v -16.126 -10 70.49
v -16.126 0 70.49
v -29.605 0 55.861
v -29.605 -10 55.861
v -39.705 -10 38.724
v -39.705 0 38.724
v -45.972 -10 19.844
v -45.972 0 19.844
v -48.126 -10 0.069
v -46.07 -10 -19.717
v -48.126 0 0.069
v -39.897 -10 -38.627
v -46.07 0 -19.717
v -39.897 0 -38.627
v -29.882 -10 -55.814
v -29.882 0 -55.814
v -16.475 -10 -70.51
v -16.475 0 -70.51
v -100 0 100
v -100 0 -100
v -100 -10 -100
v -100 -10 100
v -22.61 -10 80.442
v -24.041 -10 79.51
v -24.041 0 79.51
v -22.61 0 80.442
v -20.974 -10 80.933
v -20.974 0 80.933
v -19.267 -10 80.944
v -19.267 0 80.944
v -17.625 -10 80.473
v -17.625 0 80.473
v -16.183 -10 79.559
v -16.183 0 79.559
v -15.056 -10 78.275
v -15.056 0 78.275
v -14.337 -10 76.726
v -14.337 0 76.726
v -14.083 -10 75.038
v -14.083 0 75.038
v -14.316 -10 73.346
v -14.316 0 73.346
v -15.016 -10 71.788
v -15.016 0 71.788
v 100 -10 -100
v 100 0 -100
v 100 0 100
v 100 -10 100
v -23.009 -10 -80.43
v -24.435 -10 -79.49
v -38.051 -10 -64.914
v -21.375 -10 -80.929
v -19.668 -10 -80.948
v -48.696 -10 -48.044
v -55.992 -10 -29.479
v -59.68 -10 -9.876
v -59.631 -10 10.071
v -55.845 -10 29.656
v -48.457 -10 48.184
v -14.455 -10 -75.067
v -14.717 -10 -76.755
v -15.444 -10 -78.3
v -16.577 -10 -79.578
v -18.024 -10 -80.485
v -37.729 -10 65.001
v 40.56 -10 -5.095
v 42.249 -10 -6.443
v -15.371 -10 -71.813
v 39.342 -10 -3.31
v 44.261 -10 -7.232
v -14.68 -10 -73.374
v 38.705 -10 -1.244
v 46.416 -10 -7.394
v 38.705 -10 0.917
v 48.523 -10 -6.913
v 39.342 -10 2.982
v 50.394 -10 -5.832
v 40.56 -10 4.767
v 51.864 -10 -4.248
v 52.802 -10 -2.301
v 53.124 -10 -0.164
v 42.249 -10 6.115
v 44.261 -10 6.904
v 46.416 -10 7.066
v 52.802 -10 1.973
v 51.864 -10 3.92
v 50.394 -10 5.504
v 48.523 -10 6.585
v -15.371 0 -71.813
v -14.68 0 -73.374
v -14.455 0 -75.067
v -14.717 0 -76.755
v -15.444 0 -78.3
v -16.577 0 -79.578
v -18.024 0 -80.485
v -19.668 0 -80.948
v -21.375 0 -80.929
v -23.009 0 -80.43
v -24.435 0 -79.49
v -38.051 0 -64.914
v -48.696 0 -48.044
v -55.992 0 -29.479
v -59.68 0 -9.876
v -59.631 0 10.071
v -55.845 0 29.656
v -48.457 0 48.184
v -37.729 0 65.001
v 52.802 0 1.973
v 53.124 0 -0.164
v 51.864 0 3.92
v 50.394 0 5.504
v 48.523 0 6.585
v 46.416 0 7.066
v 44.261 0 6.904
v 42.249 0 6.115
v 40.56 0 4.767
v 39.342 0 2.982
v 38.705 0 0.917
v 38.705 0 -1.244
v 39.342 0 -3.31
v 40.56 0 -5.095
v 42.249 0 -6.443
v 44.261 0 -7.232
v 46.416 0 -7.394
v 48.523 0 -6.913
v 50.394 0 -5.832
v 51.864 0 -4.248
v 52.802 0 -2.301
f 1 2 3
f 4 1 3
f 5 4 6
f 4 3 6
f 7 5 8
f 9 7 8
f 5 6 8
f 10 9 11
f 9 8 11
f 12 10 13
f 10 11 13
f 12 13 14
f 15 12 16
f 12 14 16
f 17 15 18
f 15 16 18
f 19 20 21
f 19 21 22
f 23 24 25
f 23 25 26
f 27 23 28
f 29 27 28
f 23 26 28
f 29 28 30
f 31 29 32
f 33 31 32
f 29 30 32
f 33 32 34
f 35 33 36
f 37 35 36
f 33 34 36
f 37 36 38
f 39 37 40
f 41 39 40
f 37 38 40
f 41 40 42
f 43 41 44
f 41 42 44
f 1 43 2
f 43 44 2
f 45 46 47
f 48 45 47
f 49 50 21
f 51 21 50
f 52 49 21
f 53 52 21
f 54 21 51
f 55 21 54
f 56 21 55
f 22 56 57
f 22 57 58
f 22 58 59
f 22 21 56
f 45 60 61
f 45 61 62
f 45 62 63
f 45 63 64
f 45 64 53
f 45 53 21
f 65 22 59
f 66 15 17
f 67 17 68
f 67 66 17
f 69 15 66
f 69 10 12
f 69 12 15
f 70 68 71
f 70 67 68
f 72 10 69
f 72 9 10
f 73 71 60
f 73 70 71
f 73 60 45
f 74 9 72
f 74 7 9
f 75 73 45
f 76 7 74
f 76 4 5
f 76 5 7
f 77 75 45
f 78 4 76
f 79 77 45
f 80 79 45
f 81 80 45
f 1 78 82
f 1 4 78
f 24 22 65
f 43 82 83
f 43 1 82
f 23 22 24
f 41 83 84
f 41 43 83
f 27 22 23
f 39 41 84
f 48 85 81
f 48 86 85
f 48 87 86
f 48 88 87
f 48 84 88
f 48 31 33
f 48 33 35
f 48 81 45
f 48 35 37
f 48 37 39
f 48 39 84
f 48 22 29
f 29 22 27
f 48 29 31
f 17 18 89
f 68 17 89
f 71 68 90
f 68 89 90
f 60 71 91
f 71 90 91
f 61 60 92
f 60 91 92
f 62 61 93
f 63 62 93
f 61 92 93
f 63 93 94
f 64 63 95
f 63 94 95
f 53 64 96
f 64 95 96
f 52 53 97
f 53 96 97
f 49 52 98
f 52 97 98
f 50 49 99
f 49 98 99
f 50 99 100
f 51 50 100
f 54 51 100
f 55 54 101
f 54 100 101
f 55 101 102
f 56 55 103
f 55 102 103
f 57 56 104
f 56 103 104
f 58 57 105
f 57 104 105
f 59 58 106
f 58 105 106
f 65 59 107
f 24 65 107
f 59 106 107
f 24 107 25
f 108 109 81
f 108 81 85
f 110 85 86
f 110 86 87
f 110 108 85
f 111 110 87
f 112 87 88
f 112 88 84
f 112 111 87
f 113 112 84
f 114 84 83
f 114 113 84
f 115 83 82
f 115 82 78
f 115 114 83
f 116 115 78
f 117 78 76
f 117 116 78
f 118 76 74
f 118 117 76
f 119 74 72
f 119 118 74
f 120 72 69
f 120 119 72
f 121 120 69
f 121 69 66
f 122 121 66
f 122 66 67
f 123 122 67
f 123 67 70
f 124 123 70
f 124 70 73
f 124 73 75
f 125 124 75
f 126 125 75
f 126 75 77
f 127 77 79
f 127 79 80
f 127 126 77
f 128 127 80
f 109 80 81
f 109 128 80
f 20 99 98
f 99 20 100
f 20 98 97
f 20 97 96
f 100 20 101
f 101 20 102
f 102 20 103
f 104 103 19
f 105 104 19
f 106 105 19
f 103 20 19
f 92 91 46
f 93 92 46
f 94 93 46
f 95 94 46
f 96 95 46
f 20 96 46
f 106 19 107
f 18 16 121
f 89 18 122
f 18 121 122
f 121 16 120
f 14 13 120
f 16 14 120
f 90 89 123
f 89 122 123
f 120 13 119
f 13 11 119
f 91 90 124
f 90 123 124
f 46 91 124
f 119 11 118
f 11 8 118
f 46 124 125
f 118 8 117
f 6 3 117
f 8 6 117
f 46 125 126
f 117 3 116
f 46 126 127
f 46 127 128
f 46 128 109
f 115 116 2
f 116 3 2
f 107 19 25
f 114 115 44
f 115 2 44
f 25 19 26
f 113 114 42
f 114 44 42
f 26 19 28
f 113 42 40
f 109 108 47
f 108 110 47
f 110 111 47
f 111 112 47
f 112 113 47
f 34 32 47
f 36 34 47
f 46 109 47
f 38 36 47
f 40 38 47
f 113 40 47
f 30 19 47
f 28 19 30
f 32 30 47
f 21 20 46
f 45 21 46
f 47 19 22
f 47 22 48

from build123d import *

# Parameters (mm, degrees)
F0_W     = 200
F0_H     = 200
F0_R     = 7.25
F1_DEPTH = 10


with BuildPart() as f1:
    # F0 (on Front) → F1 (new body)
    with BuildSketch(Plane.XZ):
        Rectangle(F0_W, F0_H)
        with BuildLine():
            ThreePointArc((-24.4348083961, -79.4901646735), (-60.1255414788, 0.098775478), (-24.0407608064, 79.5098353265))
            ThreePointArc((-24.0407608064, 79.5098353265), (-15.5734786606, 78.9574468193), (-16.1258671678, 70.4901646735))
            ThreePointArc((-16.1258671678, 70.4901646735), (-48.12557833, 0.0690361286), (-16.4753055963, -70.5098353265))
            ThreePointArc((-16.4753055963, -70.5098353265), (-15.9648923227, -78.9797513999), (-24.4348083961, -79.4901646735))
        make_face(mode=Mode.SUBTRACT)
        with Locations((45.8741330018, -0.1639221083)):
            Circle(F0_R, mode=Mode.SUBTRACT)
    extrude(amount=F1_DEPTH)


solid = f1.part
